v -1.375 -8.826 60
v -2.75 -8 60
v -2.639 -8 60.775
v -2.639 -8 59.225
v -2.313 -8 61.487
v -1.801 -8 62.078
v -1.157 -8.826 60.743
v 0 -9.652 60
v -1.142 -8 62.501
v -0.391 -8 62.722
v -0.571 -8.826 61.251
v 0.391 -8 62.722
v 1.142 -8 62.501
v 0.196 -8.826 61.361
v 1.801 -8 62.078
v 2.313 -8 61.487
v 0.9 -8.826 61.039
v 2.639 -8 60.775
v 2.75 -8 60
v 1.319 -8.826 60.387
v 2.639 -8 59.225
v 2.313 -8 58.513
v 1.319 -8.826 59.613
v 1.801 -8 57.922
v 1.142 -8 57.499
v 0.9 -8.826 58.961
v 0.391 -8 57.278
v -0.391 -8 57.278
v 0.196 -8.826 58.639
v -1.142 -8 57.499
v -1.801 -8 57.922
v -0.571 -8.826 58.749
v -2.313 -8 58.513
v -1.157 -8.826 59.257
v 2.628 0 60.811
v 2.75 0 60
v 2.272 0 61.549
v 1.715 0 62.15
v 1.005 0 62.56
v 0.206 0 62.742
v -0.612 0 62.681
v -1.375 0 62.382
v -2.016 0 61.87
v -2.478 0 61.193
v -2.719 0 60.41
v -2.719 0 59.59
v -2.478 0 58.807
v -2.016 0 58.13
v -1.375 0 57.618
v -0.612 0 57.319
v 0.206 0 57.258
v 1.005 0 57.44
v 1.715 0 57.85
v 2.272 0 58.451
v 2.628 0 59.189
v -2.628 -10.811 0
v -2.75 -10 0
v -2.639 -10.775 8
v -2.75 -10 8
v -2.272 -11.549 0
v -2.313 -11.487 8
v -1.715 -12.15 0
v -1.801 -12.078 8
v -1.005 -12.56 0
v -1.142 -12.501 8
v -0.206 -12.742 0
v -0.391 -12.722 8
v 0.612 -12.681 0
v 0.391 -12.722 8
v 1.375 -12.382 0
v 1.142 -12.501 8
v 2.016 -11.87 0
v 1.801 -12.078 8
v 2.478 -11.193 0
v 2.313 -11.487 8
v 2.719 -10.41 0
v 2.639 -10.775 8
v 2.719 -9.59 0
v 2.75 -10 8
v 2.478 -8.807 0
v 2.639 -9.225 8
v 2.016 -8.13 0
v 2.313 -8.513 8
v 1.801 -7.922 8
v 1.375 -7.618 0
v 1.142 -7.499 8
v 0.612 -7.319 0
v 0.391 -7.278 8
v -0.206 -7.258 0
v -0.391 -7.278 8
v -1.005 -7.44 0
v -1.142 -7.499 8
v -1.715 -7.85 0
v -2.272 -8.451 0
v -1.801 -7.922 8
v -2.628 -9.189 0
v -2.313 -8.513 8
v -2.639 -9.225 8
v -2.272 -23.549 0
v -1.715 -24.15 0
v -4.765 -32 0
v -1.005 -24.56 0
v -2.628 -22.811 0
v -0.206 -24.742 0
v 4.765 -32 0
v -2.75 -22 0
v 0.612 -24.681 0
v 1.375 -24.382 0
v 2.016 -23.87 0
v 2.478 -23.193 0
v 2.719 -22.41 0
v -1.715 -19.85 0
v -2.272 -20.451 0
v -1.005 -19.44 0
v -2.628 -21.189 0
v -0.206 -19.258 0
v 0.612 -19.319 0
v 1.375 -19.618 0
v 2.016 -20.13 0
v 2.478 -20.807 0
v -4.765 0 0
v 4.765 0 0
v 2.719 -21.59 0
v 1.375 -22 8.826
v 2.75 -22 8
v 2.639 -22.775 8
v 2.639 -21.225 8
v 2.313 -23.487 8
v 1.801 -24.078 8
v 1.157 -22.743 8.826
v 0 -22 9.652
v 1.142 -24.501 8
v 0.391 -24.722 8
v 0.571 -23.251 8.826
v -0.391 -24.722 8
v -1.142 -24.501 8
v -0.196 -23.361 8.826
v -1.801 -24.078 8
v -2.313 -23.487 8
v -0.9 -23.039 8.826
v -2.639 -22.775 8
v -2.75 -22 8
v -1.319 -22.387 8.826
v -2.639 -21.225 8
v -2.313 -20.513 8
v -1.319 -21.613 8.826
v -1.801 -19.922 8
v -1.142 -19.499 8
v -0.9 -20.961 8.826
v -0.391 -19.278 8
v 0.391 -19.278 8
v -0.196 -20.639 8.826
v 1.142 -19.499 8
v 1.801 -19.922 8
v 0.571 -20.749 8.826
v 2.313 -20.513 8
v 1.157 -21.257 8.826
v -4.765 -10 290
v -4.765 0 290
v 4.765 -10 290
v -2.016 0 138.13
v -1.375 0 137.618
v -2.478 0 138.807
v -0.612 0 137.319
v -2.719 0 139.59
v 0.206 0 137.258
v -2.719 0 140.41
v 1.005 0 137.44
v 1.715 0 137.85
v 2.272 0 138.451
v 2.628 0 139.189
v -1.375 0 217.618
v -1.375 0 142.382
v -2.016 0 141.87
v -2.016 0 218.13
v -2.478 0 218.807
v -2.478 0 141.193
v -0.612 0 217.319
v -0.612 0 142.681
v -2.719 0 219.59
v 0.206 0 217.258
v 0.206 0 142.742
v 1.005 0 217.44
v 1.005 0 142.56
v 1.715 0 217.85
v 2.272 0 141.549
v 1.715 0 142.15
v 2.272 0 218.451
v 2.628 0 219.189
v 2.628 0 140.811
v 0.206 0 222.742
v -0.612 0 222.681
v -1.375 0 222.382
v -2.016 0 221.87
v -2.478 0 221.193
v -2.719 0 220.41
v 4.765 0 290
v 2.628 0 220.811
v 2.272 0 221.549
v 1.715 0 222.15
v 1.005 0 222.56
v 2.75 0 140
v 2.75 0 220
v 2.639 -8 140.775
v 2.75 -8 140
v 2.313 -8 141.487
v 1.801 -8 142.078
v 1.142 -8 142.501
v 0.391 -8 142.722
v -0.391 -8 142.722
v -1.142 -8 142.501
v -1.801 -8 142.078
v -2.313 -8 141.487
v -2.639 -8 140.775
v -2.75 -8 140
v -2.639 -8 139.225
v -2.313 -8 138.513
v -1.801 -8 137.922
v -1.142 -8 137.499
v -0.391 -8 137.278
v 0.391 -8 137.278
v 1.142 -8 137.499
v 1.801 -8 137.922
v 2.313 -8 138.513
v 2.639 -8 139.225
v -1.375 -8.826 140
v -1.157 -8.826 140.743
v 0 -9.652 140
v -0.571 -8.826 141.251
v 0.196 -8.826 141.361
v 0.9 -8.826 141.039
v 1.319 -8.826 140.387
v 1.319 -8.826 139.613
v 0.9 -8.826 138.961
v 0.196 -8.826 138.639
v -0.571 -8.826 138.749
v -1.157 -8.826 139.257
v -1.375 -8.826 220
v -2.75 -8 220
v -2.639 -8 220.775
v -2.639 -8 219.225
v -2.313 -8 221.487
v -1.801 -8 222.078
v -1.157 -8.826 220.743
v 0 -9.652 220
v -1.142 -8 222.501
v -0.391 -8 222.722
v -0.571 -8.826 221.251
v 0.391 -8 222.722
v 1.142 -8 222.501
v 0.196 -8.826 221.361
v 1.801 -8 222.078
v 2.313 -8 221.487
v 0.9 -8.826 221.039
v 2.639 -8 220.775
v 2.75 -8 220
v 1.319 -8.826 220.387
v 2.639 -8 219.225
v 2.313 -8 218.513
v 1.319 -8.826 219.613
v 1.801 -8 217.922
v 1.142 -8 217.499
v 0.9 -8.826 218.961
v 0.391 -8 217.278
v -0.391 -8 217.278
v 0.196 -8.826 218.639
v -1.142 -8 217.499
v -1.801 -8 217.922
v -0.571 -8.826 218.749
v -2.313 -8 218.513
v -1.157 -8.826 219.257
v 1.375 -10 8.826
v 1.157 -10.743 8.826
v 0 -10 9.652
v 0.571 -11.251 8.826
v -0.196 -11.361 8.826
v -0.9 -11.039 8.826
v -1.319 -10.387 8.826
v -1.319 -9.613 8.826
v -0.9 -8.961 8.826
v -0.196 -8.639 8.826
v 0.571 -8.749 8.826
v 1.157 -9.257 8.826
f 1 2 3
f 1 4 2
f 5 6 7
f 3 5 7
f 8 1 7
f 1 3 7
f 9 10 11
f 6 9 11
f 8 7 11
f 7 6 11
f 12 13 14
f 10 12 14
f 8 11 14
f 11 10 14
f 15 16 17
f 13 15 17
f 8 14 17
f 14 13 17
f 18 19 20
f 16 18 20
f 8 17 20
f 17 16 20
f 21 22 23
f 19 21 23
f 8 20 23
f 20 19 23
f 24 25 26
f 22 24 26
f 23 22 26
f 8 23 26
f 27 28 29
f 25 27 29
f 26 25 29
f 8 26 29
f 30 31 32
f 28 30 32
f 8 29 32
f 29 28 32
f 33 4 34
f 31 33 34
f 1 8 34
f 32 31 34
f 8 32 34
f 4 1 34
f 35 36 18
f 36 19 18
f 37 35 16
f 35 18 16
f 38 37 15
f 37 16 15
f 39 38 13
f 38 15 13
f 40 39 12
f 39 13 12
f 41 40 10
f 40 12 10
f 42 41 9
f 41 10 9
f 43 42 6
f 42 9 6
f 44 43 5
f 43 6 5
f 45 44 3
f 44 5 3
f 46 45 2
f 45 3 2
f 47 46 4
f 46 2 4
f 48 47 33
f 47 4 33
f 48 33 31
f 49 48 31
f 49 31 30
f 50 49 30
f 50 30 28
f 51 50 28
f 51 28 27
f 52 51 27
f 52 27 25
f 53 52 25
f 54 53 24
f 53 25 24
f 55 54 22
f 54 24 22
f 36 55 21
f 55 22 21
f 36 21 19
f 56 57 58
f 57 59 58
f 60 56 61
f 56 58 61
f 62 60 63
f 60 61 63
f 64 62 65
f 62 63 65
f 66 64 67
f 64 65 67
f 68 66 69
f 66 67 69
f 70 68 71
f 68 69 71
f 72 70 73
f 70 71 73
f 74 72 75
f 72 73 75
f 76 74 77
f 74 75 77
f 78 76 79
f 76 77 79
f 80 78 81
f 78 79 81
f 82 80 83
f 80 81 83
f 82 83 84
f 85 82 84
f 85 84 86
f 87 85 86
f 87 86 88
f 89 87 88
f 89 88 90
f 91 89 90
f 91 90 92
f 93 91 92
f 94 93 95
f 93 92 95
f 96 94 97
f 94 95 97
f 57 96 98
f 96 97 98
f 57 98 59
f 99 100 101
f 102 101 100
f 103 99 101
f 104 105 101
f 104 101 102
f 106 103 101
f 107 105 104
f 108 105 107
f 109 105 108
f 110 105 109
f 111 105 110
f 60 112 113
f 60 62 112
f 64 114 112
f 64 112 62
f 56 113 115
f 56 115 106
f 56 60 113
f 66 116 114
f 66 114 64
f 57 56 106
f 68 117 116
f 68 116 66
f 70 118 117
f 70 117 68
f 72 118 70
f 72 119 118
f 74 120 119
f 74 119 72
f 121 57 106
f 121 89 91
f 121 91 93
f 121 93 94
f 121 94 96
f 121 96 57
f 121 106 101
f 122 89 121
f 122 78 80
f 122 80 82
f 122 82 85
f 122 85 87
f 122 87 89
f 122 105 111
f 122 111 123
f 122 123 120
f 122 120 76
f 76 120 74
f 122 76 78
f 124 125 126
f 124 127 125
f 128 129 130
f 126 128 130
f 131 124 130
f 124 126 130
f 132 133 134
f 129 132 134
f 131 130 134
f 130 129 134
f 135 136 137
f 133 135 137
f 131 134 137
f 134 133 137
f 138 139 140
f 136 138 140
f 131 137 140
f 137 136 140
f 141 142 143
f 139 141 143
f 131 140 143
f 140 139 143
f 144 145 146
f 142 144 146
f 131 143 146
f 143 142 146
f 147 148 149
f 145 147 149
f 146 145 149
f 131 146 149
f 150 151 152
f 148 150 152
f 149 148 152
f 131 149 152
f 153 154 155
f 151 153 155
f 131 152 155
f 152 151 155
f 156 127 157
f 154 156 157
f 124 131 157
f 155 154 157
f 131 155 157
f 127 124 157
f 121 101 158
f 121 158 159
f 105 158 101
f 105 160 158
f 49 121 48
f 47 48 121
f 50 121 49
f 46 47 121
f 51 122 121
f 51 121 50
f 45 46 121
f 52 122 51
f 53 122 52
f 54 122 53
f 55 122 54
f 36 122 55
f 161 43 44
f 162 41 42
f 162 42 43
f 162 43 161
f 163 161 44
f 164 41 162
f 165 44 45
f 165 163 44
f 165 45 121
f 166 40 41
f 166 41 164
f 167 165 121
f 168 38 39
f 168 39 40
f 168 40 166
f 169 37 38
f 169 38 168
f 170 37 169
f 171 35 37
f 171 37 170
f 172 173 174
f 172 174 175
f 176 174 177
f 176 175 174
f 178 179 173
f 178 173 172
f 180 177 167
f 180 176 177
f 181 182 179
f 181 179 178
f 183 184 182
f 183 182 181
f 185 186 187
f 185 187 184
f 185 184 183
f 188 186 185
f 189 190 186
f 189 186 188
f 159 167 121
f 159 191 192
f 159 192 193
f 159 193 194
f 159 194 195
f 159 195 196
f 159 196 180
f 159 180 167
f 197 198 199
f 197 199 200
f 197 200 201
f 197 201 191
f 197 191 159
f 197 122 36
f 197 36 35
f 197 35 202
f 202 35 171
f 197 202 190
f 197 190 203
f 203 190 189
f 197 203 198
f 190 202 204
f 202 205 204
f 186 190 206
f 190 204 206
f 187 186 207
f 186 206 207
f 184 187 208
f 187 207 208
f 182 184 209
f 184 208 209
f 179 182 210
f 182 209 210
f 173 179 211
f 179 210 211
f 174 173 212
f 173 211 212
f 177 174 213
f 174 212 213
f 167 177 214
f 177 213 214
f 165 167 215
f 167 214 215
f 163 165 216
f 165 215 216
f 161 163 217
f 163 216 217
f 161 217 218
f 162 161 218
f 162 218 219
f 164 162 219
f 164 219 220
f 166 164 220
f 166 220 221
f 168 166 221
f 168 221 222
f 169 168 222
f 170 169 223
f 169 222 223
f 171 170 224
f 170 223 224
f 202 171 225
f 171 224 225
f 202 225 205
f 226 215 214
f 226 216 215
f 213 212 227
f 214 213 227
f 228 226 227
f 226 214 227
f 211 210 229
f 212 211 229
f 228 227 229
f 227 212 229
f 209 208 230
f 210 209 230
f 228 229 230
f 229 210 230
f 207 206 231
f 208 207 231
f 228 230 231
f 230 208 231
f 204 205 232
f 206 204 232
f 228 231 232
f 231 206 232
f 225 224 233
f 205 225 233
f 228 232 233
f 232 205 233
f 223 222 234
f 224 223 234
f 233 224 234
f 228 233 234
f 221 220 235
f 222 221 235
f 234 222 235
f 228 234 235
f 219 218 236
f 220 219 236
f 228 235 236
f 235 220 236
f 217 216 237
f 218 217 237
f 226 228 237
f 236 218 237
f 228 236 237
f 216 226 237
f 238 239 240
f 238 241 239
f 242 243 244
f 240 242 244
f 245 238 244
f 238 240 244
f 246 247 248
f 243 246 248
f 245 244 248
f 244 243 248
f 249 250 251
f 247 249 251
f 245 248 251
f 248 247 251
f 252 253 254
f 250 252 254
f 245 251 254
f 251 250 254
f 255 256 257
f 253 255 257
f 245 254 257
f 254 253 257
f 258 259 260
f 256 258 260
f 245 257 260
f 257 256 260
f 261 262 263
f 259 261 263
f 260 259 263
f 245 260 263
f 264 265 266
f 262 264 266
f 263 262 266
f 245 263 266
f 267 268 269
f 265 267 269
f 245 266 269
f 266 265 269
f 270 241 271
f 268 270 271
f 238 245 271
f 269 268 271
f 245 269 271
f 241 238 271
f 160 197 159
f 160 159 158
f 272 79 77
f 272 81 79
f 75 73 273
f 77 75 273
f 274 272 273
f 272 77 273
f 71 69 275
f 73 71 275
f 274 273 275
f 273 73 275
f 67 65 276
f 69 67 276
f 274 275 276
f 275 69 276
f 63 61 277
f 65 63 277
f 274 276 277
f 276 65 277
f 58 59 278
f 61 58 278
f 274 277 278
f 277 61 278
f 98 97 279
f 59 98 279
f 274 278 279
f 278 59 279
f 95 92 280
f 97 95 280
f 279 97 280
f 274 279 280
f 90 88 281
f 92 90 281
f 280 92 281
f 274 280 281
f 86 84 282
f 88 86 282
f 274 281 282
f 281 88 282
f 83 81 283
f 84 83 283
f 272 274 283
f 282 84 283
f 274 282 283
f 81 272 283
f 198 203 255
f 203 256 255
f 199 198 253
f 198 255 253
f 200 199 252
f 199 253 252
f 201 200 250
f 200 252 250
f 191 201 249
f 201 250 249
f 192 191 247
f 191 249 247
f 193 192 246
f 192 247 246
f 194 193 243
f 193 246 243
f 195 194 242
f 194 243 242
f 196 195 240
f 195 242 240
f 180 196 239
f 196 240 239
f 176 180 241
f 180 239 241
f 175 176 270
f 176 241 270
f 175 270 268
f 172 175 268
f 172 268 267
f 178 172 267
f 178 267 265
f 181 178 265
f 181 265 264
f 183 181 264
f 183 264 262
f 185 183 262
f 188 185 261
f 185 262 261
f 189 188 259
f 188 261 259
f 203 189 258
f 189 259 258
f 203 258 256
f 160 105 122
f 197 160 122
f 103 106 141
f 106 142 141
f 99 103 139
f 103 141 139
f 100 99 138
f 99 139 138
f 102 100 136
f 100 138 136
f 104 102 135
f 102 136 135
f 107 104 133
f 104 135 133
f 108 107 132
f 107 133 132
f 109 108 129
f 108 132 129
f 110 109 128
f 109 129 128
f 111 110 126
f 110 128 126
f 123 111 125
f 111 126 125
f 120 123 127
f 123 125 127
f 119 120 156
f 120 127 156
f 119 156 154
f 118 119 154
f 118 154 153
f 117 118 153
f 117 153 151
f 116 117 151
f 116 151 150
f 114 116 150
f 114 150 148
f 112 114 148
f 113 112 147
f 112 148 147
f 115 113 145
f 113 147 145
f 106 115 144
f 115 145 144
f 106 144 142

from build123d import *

# Parameters (mm, degrees)
F1_DEPTH       = 4.765
F4_D           = 5.5
F4_DEPTH       = 8
F4_TIP         = 1.6523667023
F4_ON_F3_D     = 5.5
F4_ON_F3_DEPTH = 8
F4_ON_F3_TIP   = 1.6523667023


with BuildPart() as f1:
    # F0 (on Right) → F1 (new body, symmetric)
    with BuildSketch(Plane.YZ):
        Polygon((-32, 0), (0, 0), (0, 290), (-10, 290), align=None)
    extrude(amount=F1_DEPTH, both=True)

    # F4
    with Locations(Plane(origin=(0, 0, 0), x_dir=(-1, 0, 0), z_dir=(0, 1, 0))):
        with Locations((0, 60), (0, 140), (0, 220)):
            Hole(F4_D / 2, depth=F4_DEPTH)
            with Locations((0, 0, -(F4_DEPTH + F4_TIP / 2))):  # 118° drill point
                Cone(0, F4_D / 2, F4_TIP, mode=Mode.SUBTRACT)

    # F4 on F3
    with Locations(Plane(origin=(0, 0, 0), x_dir=(1, 0, 0), z_dir=(0, 0, -1))):
        with Locations((0, 22), (0, 10)):
            Hole(F4_ON_F3_D / 2, depth=F4_ON_F3_DEPTH)
            with Locations((0, 0, -(F4_ON_F3_DEPTH + F4_ON_F3_TIP / 2))):  # 118° drill point
                Cone(0, F4_ON_F3_D / 2, F4_ON_F3_TIP, mode=Mode.SUBTRACT)


solid = f1.part
